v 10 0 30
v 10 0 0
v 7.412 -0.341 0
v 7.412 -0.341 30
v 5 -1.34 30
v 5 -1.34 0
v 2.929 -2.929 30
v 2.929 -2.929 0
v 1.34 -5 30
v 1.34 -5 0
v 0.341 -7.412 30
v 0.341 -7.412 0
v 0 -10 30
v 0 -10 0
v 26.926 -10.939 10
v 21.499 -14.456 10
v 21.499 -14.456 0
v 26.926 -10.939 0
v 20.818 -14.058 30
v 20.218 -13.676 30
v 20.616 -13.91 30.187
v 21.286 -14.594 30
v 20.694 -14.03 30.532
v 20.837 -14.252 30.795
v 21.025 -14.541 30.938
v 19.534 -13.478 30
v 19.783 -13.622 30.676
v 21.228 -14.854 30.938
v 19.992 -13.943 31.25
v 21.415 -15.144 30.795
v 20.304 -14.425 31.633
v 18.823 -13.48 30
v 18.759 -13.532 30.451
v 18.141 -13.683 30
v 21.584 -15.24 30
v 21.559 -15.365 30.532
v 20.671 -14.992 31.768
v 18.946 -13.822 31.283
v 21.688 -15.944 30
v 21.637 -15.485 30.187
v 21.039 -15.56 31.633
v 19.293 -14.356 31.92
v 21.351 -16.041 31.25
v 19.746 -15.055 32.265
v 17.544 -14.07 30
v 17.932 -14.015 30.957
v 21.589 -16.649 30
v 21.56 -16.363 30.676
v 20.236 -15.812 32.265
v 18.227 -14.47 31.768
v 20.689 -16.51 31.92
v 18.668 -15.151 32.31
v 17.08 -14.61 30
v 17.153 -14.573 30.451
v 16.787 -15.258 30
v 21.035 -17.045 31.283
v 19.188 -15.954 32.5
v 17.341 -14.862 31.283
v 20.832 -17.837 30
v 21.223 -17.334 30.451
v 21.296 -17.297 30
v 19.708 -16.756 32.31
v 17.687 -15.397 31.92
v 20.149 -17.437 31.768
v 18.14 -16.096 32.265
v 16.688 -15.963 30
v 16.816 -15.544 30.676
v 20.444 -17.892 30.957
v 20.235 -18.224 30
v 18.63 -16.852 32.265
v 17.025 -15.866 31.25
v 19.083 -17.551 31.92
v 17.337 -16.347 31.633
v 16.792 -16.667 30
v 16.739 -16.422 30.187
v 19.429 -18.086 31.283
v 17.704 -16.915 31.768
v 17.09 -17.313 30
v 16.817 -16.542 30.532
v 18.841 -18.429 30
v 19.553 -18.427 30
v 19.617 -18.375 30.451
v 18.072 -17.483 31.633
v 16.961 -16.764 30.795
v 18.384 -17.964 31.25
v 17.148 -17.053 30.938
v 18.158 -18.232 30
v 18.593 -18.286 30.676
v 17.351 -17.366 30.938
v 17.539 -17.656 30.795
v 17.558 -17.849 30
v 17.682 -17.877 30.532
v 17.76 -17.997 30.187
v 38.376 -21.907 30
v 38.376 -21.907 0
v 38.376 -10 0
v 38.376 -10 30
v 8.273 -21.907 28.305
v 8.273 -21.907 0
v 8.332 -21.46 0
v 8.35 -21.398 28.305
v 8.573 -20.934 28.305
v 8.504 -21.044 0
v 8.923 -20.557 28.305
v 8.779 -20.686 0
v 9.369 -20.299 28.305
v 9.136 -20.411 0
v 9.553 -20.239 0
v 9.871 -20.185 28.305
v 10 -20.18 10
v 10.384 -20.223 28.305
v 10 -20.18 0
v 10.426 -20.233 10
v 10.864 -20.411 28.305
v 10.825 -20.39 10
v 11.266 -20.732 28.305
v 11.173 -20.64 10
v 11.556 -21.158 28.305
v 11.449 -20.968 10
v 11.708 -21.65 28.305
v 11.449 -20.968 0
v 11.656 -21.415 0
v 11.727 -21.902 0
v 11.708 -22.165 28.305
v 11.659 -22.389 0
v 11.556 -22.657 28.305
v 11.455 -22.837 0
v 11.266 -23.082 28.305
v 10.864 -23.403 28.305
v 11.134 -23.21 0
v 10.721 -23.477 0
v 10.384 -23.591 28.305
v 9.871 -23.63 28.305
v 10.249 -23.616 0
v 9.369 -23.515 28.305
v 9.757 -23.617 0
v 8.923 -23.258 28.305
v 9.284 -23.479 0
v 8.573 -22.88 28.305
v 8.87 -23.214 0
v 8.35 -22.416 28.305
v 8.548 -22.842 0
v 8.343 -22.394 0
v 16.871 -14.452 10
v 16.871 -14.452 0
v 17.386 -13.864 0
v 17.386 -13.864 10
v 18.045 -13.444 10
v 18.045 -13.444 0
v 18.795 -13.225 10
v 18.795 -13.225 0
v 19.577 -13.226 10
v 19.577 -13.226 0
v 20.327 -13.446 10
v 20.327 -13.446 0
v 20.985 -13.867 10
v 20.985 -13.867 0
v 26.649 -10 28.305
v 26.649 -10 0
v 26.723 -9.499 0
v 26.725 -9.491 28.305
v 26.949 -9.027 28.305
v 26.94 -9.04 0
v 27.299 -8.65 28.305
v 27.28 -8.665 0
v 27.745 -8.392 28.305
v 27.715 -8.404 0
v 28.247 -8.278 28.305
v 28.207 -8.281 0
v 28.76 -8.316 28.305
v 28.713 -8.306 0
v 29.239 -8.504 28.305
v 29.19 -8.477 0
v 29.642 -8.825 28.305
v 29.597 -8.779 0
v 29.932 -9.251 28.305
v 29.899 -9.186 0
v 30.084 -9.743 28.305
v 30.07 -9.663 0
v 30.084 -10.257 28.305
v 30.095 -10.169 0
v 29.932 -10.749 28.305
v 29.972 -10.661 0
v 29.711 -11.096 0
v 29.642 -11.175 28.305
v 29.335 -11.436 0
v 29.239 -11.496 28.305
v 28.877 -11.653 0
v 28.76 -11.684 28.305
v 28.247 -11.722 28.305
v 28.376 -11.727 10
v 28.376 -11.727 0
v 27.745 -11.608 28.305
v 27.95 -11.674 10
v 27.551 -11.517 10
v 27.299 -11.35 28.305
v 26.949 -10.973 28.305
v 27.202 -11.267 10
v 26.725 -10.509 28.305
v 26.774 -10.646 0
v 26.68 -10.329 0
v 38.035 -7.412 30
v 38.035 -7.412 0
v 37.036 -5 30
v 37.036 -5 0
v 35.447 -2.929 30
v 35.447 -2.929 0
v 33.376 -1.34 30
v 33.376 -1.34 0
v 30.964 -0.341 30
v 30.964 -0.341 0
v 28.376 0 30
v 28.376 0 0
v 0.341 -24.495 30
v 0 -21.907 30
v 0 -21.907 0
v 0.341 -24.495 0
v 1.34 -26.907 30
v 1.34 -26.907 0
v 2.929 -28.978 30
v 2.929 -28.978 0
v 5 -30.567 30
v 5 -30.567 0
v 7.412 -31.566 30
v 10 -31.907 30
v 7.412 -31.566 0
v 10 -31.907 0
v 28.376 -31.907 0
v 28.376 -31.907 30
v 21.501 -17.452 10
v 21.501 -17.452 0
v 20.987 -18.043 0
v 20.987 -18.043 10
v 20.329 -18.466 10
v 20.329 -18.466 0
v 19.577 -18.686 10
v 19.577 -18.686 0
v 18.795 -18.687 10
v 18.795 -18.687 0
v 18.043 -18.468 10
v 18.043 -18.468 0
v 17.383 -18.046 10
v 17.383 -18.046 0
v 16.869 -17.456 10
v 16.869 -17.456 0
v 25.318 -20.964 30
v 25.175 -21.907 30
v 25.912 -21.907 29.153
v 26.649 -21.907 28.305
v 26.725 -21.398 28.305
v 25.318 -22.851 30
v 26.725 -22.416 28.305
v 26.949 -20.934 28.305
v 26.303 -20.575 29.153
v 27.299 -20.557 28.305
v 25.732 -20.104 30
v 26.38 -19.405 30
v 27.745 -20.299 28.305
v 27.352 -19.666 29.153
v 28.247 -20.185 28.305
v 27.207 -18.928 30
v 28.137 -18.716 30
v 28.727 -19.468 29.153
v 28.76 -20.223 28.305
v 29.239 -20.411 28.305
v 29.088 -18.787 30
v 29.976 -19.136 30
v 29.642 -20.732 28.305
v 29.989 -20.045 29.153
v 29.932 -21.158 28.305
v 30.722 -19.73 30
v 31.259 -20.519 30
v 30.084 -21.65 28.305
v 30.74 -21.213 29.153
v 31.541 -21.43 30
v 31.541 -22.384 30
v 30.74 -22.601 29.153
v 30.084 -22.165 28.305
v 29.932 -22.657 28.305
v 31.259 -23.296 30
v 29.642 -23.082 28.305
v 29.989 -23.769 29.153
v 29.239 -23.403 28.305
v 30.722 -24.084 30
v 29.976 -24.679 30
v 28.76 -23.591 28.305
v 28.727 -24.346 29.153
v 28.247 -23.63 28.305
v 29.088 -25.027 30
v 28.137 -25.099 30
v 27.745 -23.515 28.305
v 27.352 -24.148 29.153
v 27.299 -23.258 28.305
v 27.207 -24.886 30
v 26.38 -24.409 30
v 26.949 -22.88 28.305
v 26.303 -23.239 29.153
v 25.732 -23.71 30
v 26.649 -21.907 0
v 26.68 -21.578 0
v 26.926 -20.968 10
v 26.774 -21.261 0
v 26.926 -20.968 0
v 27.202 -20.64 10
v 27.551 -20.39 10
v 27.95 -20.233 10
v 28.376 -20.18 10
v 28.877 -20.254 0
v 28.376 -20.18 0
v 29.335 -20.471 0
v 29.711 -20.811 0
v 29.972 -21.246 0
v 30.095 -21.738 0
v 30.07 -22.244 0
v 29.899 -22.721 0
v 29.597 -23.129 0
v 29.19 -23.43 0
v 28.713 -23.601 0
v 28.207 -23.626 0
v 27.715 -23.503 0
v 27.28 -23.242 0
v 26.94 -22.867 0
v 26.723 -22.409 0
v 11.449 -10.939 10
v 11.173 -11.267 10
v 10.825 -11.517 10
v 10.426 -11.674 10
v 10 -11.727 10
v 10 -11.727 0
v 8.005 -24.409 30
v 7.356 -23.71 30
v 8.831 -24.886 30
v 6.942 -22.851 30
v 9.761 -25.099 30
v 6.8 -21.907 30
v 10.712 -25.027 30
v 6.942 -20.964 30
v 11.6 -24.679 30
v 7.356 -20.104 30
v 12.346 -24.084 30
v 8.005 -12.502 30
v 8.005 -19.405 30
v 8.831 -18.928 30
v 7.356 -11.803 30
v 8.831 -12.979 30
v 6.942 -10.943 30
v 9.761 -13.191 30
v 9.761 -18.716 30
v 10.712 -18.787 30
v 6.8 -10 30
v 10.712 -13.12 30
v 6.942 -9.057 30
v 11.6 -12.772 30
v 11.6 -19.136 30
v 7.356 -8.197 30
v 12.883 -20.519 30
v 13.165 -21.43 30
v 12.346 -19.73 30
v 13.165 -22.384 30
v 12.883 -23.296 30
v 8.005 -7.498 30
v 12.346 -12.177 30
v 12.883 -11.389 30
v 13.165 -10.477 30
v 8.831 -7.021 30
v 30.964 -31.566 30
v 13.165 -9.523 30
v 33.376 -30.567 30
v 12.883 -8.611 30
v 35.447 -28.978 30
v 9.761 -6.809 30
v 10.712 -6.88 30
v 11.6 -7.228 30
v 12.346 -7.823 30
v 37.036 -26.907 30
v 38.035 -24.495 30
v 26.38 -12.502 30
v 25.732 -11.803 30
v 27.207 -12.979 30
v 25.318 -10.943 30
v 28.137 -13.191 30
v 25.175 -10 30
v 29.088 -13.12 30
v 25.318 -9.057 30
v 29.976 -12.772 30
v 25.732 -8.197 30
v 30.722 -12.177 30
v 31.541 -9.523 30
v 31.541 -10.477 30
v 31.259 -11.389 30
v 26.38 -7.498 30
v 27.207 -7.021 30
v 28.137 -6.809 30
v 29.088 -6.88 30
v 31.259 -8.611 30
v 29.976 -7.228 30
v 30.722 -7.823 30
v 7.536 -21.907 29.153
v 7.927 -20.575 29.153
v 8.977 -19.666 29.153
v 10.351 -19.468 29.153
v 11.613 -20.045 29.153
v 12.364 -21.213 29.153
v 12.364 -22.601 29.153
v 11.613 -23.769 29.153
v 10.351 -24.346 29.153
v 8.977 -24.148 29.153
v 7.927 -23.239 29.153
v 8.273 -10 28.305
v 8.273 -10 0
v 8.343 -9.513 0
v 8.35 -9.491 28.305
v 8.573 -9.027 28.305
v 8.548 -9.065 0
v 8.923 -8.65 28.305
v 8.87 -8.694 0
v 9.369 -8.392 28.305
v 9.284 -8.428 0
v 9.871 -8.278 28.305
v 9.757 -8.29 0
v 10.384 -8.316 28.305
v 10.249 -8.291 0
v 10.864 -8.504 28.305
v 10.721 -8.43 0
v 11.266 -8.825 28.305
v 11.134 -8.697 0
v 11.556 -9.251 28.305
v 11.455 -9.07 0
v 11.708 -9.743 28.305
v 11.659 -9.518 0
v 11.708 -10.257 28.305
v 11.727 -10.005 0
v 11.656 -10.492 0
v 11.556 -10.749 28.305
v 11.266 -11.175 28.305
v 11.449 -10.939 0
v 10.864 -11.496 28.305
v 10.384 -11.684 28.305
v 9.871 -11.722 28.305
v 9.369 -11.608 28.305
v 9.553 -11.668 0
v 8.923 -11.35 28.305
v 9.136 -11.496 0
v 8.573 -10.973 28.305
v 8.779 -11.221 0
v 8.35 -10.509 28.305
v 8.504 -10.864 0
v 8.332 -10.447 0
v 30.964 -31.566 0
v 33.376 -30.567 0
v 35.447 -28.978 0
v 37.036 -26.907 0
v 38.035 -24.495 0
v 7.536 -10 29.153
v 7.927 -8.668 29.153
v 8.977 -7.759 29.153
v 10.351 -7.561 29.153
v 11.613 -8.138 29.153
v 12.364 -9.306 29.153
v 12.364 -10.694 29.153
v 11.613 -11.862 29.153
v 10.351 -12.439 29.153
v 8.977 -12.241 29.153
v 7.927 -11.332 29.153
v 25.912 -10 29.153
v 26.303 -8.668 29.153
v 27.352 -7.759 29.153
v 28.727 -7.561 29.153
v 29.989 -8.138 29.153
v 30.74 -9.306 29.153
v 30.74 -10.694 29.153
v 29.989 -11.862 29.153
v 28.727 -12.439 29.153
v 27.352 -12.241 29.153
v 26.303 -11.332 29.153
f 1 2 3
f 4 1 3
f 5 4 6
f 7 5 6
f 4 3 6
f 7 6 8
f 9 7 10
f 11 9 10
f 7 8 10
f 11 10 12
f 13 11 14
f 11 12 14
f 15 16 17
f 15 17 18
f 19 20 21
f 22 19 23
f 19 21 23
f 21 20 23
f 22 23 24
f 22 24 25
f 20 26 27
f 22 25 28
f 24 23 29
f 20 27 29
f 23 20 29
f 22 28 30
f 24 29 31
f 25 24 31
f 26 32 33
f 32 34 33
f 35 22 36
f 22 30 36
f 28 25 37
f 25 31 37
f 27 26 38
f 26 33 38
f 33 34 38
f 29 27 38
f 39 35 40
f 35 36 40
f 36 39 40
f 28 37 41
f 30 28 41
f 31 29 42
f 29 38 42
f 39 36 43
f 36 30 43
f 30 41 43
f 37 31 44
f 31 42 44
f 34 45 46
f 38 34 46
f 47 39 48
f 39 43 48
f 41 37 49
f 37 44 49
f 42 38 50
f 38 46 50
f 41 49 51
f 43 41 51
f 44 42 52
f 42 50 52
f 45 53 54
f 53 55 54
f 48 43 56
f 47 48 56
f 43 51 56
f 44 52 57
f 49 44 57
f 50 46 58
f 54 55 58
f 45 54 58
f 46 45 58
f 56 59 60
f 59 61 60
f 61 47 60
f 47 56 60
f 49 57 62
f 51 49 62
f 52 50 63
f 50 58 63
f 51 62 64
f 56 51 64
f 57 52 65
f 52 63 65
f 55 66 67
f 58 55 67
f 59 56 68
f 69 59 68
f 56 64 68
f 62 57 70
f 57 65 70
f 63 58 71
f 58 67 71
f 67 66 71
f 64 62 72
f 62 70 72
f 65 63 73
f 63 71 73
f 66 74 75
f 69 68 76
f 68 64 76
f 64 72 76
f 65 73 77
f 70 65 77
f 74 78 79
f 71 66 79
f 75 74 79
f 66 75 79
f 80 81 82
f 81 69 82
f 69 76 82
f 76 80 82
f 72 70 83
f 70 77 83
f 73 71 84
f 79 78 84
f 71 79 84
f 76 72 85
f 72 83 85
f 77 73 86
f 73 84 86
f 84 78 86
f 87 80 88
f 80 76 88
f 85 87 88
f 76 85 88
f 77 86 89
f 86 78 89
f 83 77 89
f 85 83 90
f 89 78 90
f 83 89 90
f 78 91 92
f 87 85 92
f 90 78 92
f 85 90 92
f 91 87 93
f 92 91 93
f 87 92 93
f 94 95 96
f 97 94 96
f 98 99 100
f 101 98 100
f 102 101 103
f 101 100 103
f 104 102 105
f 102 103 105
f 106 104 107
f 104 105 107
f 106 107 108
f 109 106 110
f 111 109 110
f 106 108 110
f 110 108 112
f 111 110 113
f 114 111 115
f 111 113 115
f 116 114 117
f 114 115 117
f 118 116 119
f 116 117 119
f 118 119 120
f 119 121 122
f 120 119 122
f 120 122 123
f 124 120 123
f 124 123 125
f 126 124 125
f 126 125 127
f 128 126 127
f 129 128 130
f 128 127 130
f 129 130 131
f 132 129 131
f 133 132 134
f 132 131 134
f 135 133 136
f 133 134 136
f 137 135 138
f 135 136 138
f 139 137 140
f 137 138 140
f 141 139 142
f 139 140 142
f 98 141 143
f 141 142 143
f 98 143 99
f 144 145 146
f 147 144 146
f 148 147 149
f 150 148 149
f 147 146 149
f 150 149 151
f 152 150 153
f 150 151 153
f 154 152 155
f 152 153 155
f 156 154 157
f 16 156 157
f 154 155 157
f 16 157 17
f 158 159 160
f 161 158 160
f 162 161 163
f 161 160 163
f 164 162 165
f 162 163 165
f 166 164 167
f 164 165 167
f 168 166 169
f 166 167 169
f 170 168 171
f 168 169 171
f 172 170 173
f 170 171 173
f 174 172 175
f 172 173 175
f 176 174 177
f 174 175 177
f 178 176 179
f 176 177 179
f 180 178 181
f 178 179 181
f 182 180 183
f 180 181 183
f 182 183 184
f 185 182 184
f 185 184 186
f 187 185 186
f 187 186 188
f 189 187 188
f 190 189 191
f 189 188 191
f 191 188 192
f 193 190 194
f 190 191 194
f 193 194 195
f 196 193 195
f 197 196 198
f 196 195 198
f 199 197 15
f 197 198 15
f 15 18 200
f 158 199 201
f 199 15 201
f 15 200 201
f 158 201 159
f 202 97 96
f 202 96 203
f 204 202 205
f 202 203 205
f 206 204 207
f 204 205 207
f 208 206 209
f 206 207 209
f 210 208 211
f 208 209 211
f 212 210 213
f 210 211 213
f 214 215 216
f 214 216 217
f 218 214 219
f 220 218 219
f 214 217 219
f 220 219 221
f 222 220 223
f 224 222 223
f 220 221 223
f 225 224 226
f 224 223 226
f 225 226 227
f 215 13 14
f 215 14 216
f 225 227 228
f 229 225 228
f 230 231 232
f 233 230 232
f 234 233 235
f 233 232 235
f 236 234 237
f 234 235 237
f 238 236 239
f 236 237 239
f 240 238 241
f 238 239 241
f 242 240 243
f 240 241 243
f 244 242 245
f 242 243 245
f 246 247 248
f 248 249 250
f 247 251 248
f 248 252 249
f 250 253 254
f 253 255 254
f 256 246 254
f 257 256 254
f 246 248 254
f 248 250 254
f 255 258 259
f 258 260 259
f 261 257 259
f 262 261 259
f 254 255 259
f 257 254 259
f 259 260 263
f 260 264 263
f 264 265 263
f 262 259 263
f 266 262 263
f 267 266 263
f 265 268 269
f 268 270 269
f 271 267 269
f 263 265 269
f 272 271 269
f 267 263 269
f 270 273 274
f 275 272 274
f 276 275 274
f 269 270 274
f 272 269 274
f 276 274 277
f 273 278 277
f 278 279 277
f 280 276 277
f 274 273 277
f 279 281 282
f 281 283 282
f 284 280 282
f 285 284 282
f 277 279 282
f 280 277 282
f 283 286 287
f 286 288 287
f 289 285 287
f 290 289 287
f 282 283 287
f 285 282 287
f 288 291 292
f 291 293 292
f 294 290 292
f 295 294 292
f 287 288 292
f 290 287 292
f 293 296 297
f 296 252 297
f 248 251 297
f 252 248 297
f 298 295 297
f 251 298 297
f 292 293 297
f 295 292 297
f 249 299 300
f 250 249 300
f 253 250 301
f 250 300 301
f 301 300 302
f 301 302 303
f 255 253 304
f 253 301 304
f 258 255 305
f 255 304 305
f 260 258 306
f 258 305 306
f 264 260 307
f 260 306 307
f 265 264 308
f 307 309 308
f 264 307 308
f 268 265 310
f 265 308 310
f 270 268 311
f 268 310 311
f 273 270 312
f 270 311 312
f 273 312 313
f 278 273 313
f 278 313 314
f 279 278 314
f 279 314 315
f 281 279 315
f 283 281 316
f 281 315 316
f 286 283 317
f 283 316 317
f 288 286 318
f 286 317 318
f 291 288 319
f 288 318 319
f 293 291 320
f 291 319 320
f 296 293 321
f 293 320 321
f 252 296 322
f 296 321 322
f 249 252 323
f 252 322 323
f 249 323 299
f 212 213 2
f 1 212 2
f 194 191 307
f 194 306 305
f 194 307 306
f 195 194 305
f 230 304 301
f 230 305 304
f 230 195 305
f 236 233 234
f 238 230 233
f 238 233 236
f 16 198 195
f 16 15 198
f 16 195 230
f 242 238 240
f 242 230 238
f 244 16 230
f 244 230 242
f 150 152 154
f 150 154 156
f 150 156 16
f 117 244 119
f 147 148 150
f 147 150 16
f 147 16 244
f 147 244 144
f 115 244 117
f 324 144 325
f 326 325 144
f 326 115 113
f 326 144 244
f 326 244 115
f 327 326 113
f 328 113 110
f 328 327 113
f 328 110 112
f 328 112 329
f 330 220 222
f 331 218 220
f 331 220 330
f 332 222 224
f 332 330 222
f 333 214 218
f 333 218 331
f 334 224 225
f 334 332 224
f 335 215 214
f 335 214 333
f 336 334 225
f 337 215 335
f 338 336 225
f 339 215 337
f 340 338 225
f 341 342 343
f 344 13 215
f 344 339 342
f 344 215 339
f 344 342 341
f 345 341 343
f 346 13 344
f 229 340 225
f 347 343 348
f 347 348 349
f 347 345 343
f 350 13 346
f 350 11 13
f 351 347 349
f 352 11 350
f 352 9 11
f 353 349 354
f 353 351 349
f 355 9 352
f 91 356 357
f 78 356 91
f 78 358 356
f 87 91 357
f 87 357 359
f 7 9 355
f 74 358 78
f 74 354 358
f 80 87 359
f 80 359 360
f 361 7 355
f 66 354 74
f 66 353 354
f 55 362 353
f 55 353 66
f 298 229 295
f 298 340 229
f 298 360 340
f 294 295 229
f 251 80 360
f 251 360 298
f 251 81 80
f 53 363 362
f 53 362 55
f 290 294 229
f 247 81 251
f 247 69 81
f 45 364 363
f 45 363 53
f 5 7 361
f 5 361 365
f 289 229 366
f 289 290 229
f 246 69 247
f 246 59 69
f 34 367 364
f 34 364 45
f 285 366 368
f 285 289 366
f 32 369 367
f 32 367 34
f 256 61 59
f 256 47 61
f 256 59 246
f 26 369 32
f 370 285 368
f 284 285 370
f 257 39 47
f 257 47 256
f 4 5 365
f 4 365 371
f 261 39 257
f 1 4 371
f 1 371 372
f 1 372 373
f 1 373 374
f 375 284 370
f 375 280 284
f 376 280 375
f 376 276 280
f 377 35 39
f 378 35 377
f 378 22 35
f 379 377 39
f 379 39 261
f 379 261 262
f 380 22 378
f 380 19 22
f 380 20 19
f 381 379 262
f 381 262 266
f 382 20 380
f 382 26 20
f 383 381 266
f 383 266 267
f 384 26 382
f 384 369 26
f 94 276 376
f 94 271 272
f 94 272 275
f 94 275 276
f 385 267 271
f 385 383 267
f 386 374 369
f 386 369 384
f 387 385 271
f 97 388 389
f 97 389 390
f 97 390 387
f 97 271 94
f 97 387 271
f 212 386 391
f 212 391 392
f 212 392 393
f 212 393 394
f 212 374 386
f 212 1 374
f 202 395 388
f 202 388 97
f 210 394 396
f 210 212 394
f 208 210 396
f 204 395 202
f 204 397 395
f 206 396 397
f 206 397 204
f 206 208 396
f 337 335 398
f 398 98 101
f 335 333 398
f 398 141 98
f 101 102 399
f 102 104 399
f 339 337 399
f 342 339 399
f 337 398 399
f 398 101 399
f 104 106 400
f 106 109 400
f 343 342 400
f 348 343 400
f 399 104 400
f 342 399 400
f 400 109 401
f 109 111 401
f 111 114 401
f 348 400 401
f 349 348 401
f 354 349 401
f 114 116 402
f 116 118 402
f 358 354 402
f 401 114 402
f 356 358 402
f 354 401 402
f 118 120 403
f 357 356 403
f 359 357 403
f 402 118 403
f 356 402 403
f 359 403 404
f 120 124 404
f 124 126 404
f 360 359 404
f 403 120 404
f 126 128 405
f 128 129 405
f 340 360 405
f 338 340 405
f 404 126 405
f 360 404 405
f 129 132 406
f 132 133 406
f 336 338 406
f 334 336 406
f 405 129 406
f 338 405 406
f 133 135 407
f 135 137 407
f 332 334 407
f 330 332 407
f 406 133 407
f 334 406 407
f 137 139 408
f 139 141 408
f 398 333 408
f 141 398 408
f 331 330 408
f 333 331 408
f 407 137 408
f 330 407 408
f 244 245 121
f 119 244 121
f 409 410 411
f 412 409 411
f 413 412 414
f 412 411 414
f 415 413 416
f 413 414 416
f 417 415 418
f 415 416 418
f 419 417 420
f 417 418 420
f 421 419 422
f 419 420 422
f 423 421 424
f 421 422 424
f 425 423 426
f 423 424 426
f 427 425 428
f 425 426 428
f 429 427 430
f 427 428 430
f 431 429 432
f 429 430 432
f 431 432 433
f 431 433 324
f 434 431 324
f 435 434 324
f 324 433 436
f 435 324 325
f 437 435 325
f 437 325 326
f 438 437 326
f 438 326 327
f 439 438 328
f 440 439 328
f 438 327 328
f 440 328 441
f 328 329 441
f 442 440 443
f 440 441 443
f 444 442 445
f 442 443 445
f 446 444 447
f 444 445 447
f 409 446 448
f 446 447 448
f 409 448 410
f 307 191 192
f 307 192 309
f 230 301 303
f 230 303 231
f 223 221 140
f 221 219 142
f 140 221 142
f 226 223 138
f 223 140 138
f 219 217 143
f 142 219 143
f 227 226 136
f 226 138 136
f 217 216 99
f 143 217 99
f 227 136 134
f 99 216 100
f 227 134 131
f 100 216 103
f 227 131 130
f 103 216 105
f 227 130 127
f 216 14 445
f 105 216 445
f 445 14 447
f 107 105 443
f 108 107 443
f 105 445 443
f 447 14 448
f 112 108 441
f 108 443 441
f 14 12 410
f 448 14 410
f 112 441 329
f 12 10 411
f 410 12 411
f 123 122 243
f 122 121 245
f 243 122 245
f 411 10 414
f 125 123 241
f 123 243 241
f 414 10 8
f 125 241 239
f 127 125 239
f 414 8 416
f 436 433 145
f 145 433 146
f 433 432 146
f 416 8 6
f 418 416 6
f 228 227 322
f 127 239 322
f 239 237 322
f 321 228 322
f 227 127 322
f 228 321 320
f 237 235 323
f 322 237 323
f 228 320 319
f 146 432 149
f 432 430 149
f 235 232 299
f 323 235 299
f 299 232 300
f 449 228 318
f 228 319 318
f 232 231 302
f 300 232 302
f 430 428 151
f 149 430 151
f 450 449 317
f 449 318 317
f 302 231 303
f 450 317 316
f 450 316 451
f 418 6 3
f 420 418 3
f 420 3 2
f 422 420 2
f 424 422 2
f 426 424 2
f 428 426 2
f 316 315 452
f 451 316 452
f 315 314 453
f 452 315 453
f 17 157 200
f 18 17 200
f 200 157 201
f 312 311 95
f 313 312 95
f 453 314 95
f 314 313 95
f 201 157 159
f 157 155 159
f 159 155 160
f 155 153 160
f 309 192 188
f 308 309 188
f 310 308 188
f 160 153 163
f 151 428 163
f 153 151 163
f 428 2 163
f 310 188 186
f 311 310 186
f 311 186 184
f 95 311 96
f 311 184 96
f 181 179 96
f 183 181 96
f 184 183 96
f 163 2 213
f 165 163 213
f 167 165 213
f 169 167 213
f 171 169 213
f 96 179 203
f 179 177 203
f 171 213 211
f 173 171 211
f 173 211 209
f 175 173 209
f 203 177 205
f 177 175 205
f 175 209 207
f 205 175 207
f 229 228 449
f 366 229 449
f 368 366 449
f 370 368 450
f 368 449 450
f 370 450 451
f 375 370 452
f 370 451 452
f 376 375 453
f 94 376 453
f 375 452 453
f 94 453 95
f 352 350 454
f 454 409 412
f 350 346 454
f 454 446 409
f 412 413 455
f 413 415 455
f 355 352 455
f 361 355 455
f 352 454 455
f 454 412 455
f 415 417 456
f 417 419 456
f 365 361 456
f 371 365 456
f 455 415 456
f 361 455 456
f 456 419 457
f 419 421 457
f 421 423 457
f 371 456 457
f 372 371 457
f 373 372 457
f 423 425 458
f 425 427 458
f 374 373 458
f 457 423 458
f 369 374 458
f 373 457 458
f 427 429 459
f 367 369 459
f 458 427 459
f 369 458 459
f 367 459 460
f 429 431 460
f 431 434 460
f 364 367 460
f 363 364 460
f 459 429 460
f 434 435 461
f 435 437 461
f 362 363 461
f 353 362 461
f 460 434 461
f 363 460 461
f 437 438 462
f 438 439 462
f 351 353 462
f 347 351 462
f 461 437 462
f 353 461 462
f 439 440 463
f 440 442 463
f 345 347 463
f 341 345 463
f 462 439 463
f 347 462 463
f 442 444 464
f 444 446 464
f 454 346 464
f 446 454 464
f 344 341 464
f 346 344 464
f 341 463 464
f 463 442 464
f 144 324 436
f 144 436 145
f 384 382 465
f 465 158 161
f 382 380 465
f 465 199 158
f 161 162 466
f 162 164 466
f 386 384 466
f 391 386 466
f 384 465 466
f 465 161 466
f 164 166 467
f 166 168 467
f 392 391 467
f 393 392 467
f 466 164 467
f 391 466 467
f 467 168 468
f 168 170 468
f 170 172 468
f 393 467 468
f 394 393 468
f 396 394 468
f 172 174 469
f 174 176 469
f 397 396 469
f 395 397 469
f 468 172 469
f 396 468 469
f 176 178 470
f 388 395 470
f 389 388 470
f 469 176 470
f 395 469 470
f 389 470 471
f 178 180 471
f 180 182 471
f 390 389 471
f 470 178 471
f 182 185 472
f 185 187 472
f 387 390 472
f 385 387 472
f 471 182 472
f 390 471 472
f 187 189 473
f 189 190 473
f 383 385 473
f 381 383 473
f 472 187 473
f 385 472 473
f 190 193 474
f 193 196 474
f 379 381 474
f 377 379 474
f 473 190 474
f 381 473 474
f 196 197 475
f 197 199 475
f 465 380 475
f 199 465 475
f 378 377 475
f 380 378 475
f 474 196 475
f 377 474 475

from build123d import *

# Parameters (mm, degrees)
ESBO_O1_R                                            = 1.6
RESSALTO_EXTRUS_O1_DEPTH                             = 30
ESCAREADO_PARA_PARAFUSO_DE_M_QUINA_COM_C_D           = 3.4544
ESCAREADO_PARA_PARAFUSO_DE_M_QUINA_COM_C_CSINK_D     = 6.4008
ESCAREADO_PARA_PARAFUSO_DE_M_QUINA_COM_C_CSINK_ANGLE = 82
CORTE_EXTRUS_O3_DEPTH                                = 10
ESBO_O28_R                                           = 2.758385
CORTE_EXTRUS_O8_DEPTH                                = 10


with BuildPart() as part:
    # Esboço1 → Ressalto-extrusão1 (new body)
    with BuildSketch(Plane.XY):
        with BuildLine():
            Line((0, -10), (0, -21.90721))
            ThreePointArc((0, -21.90721), (2.928932, -28.978277), (10, -31.90721))
            Line((10, -31.90721), (28.375876, -31.90721))
            ThreePointArc((28.375876, -31.90721), (35.446943, -28.978277), (38.375876, -21.90721))
            Line((38.375876, -21.90721), (38.375876, -10))
            ThreePointArc((38.375876, -10), (35.446943, -2.928932), (28.375876, 0))
            Line((28.375876, 0), (10, 0))
            ThreePointArc((10, 0), (2.928932, -2.928932), (0, -10))
        make_face()
        with Locations((28.375876, -10)):
            Circle(ESBO_O1_R, mode=Mode.SUBTRACT)
        with Locations((10, -10)):
            Circle(ESBO_O1_R, mode=Mode.SUBTRACT)
        with Locations((10, -21.90721)):
            Circle(ESBO_O1_R, mode=Mode.SUBTRACT)
        with Locations((28.375876, -21.90721)):
            Circle(ESBO_O1_R, mode=Mode.SUBTRACT)
    extrude(amount=RESSALTO_EXTRUS_O1_DEPTH)

    # Escareado para parafuso de máquina com cabeça oval de #52 (through all)
    with Locations(Plane.XY.offset(30)):
        with Locations((10, -10), (28.375876, -10), (28.375876, -21.90721), (10, -21.90721)):
            CounterSinkHole(ESCAREADO_PARA_PARAFUSO_DE_M_QUINA_COM_C_D / 2, ESCAREADO_PARA_PARAFUSO_DE_M_QUINA_COM_C_CSINK_D / 2, counter_sink_angle=ESCAREADO_PARA_PARAFUSO_DE_M_QUINA_COM_C_CSINK_ANGLE)

    # Esboço23 → Corte-extrusão3 (cut)
    with BuildSketch(Plane(origin=(0, 0, 0), x_dir=(-1, 0, 0), z_dir=(0, 0, -1))):
        Polygon((-19.187938, -15.953605), (-28.375876, -10), (-28.375876, -21.90721), align=None)
        with BuildLine():
            ThreePointArc((-19.183742, -15.950886), (-19.182938, -15.953605), (-19.183742, -15.956324))
            Line((-19.183742, -15.956324), (-10, -21.90721))
            Line((-10, -21.90721), (-10, -10))
            Line((-10, -10), (-19.183742, -15.950886))
        make_face()
    extrude(amount=-CORTE_EXTRUS_O3_DEPTH, mode=Mode.SUBTRACT)

    # Esboço28 → Corte-extrusão8 (cut)
    with BuildSketch(Plane(origin=(0, 0, 0), x_dir=(-1, 0, 0), z_dir=(0, 0, -1))):
        with Locations((-19.183742, -15.956324)):
            Circle(ESBO_O28_R)
    extrude(amount=-CORTE_EXTRUS_O8_DEPTH, mode=Mode.SUBTRACT)

    # Esboço29 → bola (revolve)
    with BuildSketch(Plane.XY.offset(30)):
        with BuildLine():
            ThreePointArc((21.285981, -14.594114), (17.828447, -13.855562), (17.089895, -17.313096))
            Line((17.089895, -17.313096), (21.285981, -14.594114))
        make_face()
        with BuildLine():
            Line((21.285981, -14.594114), (17.089895, -17.313096))
            ThreePointArc((17.089895, -17.313096), (19.896772, -18.35101), (21.687938, -15.953605))
            ThreePointArc((21.687938, -15.953605), (21.585343, -15.24477), (21.285981, -14.594114))
        make_face()
    revolve(axis=Axis((10, -21.90721, 30), (0.8392171833395659, 0.5437963949748155, 0)))


solid = part.part
